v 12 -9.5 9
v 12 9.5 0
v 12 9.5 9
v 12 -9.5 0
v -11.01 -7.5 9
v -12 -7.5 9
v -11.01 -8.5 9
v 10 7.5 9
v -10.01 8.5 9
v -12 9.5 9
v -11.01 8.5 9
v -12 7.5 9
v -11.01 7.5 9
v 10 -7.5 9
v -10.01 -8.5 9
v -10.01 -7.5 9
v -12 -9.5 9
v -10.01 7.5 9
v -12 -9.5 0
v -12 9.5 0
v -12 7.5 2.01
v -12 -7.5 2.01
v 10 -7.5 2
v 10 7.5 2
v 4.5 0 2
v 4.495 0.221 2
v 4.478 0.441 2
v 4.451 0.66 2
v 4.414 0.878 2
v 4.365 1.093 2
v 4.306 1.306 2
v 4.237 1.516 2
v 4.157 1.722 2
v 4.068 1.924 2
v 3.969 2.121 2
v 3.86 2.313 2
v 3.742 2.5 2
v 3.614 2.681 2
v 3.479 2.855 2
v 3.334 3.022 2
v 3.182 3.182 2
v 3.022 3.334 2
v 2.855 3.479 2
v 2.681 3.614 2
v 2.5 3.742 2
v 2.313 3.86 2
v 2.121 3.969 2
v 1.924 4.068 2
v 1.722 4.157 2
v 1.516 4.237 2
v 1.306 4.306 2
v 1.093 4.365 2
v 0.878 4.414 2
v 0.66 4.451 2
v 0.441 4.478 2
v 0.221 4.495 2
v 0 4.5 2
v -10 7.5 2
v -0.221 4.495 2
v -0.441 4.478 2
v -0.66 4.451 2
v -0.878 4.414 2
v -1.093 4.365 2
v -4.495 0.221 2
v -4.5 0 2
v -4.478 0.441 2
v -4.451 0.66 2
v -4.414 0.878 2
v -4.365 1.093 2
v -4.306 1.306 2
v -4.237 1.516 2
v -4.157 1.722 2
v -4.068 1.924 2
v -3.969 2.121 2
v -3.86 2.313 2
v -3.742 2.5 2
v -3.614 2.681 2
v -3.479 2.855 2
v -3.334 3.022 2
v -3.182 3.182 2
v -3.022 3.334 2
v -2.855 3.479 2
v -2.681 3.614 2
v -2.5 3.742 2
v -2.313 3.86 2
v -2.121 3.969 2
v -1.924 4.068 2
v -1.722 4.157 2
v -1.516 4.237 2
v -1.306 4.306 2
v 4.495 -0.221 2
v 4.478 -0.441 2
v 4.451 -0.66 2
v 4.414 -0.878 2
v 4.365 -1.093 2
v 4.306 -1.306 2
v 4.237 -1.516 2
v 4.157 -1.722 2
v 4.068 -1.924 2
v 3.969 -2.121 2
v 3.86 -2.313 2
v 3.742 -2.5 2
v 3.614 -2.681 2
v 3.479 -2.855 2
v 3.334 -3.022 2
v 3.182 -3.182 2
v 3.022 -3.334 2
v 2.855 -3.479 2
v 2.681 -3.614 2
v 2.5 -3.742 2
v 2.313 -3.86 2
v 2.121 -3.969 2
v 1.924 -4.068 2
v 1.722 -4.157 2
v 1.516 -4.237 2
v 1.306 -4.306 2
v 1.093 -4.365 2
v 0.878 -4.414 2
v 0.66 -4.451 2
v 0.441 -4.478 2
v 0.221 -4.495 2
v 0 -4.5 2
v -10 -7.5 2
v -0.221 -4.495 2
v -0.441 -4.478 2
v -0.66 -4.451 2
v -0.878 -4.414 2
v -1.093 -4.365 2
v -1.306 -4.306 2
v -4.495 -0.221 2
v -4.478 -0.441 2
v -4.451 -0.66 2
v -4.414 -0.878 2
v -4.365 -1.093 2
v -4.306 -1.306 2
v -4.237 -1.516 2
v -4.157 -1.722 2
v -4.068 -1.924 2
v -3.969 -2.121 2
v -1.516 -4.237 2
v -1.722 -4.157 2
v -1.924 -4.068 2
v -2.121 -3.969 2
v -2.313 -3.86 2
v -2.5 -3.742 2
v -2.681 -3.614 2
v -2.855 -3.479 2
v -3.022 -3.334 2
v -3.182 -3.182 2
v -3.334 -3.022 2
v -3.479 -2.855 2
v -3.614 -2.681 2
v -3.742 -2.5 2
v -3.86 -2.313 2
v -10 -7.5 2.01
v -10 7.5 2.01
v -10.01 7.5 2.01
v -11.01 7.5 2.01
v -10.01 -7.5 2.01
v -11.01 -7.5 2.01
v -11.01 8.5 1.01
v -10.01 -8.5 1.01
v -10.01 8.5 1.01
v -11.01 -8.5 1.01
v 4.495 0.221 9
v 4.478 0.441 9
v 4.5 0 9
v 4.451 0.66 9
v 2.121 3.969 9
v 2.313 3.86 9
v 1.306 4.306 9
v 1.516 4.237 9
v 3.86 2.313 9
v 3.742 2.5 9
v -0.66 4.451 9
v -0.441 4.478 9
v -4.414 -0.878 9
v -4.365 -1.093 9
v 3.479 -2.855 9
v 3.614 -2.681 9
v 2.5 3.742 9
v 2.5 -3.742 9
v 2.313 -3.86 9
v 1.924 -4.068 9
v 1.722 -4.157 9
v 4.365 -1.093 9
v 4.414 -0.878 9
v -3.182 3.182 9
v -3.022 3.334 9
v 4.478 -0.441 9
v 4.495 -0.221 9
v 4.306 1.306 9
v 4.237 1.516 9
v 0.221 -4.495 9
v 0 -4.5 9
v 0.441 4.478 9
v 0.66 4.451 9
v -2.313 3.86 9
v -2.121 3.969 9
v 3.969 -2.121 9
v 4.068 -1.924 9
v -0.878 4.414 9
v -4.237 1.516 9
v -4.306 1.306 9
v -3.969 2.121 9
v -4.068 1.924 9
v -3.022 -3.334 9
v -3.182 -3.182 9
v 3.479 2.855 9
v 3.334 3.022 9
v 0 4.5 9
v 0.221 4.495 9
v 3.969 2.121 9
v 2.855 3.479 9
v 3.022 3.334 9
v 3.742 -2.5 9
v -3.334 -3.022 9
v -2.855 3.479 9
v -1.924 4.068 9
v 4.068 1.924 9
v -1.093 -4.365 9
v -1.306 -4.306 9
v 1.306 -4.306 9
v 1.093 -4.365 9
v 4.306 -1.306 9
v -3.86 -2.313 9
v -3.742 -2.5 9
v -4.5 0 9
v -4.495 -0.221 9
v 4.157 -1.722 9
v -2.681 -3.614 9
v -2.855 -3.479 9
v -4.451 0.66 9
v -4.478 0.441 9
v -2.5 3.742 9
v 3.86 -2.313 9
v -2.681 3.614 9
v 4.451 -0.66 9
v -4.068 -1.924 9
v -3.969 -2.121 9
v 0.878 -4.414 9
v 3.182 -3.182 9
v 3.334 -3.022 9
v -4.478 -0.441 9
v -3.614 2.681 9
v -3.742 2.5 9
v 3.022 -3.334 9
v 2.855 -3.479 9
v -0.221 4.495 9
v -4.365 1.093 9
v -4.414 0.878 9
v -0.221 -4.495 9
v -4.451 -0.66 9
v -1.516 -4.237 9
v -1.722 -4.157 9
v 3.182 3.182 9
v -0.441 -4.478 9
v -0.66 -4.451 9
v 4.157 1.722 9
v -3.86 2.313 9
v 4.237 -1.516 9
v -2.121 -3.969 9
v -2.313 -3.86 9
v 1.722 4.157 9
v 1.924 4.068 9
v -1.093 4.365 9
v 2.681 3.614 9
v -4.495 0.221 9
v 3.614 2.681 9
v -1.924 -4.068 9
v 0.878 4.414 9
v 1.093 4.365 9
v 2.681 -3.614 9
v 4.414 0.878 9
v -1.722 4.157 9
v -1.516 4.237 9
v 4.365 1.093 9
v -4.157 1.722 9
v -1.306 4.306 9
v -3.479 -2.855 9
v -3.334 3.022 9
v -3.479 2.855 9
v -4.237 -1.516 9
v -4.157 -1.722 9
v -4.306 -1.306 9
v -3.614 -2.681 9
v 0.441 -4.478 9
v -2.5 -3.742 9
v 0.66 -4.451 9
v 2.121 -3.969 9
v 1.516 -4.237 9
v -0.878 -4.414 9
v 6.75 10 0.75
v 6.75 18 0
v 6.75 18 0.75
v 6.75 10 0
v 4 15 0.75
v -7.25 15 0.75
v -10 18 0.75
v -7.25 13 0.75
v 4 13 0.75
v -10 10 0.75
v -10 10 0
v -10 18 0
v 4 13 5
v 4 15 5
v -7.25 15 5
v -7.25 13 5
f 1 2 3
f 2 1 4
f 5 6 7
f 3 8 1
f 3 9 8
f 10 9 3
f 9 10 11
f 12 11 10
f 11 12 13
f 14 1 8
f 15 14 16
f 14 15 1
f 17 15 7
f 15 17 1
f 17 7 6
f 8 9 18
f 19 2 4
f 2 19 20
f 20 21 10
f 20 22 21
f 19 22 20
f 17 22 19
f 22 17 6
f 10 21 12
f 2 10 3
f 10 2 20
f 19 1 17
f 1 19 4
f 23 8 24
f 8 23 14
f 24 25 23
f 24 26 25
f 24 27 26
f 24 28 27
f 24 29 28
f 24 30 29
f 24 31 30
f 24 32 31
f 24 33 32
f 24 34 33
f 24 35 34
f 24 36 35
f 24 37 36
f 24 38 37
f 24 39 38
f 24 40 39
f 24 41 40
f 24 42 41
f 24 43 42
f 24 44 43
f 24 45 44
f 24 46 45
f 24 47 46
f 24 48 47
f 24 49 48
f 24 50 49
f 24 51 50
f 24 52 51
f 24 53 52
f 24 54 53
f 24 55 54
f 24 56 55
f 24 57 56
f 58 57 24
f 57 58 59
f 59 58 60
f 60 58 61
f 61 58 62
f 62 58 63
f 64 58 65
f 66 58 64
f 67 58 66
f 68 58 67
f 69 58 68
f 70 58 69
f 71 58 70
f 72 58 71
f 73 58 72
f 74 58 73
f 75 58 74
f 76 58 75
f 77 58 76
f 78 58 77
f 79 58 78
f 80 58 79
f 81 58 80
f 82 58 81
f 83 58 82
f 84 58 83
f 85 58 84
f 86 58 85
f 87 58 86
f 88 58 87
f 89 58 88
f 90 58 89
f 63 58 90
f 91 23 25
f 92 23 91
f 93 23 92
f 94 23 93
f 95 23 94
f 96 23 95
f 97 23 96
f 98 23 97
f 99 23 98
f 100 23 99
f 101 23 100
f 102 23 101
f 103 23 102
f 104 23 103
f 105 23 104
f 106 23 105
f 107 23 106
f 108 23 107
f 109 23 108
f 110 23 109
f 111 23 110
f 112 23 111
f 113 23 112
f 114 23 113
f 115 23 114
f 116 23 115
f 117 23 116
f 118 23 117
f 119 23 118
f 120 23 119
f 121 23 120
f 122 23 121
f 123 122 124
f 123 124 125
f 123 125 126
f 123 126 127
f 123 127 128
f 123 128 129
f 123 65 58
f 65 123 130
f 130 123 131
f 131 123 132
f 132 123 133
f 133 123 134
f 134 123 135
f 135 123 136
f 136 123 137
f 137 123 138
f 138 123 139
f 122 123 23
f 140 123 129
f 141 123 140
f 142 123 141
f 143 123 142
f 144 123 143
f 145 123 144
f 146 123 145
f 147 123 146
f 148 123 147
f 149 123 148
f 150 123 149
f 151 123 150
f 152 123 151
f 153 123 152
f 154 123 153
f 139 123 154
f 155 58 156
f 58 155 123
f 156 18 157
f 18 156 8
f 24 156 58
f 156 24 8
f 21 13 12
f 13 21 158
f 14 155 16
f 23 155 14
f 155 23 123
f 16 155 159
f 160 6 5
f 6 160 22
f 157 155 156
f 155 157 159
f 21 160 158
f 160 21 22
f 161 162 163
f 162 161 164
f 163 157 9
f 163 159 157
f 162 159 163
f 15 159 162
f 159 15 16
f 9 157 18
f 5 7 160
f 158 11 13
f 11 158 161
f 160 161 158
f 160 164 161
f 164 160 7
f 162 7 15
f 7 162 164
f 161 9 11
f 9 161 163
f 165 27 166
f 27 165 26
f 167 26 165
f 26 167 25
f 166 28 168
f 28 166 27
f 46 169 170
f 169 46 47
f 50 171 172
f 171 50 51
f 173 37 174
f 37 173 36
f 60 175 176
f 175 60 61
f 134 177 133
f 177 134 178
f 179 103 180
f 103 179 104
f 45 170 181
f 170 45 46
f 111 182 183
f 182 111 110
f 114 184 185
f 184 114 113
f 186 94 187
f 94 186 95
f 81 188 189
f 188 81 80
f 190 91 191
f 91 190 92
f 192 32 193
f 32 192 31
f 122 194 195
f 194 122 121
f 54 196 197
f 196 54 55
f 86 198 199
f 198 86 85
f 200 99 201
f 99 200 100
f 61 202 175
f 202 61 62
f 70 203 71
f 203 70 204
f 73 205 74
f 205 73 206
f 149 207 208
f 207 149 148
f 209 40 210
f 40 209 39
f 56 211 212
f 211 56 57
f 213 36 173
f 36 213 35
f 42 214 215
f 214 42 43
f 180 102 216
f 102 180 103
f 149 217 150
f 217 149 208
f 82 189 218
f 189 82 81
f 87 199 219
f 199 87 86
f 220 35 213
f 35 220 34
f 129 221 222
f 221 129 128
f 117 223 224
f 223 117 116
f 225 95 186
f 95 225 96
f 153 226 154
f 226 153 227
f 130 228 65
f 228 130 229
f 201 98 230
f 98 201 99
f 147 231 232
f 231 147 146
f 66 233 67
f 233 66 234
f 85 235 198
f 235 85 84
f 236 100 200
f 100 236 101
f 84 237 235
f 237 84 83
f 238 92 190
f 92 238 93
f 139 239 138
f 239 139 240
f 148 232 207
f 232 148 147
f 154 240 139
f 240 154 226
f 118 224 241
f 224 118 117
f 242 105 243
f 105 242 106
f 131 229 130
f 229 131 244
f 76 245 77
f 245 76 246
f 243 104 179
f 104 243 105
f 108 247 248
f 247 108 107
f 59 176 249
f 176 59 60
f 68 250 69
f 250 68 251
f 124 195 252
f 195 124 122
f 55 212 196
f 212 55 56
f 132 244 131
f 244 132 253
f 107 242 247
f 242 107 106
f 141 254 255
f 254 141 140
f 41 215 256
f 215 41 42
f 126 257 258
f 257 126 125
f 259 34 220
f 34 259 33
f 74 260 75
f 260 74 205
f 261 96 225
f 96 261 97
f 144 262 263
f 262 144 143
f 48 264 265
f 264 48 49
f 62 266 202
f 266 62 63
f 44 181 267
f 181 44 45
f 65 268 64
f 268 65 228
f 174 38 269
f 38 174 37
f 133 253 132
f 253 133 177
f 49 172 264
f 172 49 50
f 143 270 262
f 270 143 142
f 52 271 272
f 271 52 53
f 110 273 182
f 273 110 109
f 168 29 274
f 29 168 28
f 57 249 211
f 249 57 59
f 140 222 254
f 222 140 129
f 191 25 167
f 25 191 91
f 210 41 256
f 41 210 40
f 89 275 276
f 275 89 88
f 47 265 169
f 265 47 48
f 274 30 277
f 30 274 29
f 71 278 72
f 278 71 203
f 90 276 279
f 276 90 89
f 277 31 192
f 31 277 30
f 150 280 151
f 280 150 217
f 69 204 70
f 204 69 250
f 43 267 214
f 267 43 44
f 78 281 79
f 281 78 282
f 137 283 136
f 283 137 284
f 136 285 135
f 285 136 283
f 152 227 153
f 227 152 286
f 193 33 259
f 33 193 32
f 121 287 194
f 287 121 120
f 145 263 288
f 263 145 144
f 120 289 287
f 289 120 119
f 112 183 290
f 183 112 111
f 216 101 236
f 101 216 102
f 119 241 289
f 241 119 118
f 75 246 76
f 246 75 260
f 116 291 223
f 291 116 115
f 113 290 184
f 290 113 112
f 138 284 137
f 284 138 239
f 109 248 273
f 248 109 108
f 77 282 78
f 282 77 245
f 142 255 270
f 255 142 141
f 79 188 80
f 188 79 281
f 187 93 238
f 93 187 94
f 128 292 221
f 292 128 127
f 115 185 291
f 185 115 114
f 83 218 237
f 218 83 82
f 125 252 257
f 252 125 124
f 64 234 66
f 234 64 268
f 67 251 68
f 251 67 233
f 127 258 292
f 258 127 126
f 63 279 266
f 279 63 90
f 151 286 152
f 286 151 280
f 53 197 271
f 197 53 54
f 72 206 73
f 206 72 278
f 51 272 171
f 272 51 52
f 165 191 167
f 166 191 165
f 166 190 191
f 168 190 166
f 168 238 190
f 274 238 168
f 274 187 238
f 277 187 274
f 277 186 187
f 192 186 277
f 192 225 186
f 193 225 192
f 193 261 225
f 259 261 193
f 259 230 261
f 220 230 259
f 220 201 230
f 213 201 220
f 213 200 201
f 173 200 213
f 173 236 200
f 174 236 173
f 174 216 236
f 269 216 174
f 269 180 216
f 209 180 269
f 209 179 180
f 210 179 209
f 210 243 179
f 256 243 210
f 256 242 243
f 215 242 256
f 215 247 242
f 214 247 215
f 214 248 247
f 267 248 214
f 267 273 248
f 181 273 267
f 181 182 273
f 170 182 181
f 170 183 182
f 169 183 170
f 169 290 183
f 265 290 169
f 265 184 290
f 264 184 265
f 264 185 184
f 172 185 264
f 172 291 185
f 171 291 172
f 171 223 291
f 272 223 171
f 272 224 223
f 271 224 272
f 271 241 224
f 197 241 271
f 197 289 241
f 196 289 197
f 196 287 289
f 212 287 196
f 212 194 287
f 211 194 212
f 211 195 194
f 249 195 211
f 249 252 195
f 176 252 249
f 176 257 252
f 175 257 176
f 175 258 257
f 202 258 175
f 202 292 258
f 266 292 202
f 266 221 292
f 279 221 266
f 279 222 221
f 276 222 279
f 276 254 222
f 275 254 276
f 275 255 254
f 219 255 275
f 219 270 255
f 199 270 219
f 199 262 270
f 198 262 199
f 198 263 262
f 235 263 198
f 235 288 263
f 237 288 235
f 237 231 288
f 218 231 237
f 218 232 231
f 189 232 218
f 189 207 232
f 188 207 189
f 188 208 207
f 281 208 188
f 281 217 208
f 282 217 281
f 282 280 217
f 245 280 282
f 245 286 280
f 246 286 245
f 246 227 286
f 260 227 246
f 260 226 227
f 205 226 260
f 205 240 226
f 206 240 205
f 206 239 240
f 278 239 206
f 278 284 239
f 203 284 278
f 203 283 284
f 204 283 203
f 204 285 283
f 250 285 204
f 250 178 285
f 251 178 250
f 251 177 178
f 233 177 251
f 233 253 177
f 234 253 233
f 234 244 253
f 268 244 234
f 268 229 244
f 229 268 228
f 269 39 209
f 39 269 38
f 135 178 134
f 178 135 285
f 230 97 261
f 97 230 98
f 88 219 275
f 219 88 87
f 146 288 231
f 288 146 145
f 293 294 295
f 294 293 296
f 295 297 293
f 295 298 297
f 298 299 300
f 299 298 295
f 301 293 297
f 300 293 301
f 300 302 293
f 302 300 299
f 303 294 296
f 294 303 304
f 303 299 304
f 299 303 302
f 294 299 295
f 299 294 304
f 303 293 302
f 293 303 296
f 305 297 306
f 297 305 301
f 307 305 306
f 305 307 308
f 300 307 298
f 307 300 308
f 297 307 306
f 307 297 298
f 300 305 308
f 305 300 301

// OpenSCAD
l = 20; //length of well
w =15; //width of well
h = 7; //height of well
diameter = 9; //diameter of well hole
t = 2; //mould wall thickness
eps = 0.01; //epsilon
tolerance = 0.25; //tolerance for intersecting pieces
distance = 10; //distance to separate door from mould
grip = 5; //size of the gate handle
faces = 128; //number of cilinder faces

module mould(){
difference(){
        
    translate([-(l/2 + t),-(w/2 + t),0]) 
        cube([l+t*2, w+t*2, h+t]);

    translate([-l/2,-w/2,t]) 
        cube([l,w,h+eps]);
    
    
    translate([-(l+t*2)/2-eps,-(w)/2,h+t+eps]) 
        rotate([0,90,0]) 
            cube([h, w, t+eps*2]);

    translate([-(l+t)/2-eps,-(w+t)/2,h+t+eps]) 
        rotate([0,90,0]) 
            cube([h+t/2, w+t, t/2]);
    
}


cylinder(h+t,d=diameter, $fn=faces);

};


mould();
 
module gate(){
    cube([w+t-tolerance, h+t/2, t/2-tolerance]);
        
    translate([(w+t-tolerance)/2-(w*0.75)/2,(h-t/2)/2,0]) 
        cube([w*0.75,t,grip]);
    
};

color("red") translate([-distance,distance,0]) gate();

//color("red") translate([-l/2 - tolerance/2,(w+t-tolerance)/2,t/2]) rotate([90,0,-90]) gate();
